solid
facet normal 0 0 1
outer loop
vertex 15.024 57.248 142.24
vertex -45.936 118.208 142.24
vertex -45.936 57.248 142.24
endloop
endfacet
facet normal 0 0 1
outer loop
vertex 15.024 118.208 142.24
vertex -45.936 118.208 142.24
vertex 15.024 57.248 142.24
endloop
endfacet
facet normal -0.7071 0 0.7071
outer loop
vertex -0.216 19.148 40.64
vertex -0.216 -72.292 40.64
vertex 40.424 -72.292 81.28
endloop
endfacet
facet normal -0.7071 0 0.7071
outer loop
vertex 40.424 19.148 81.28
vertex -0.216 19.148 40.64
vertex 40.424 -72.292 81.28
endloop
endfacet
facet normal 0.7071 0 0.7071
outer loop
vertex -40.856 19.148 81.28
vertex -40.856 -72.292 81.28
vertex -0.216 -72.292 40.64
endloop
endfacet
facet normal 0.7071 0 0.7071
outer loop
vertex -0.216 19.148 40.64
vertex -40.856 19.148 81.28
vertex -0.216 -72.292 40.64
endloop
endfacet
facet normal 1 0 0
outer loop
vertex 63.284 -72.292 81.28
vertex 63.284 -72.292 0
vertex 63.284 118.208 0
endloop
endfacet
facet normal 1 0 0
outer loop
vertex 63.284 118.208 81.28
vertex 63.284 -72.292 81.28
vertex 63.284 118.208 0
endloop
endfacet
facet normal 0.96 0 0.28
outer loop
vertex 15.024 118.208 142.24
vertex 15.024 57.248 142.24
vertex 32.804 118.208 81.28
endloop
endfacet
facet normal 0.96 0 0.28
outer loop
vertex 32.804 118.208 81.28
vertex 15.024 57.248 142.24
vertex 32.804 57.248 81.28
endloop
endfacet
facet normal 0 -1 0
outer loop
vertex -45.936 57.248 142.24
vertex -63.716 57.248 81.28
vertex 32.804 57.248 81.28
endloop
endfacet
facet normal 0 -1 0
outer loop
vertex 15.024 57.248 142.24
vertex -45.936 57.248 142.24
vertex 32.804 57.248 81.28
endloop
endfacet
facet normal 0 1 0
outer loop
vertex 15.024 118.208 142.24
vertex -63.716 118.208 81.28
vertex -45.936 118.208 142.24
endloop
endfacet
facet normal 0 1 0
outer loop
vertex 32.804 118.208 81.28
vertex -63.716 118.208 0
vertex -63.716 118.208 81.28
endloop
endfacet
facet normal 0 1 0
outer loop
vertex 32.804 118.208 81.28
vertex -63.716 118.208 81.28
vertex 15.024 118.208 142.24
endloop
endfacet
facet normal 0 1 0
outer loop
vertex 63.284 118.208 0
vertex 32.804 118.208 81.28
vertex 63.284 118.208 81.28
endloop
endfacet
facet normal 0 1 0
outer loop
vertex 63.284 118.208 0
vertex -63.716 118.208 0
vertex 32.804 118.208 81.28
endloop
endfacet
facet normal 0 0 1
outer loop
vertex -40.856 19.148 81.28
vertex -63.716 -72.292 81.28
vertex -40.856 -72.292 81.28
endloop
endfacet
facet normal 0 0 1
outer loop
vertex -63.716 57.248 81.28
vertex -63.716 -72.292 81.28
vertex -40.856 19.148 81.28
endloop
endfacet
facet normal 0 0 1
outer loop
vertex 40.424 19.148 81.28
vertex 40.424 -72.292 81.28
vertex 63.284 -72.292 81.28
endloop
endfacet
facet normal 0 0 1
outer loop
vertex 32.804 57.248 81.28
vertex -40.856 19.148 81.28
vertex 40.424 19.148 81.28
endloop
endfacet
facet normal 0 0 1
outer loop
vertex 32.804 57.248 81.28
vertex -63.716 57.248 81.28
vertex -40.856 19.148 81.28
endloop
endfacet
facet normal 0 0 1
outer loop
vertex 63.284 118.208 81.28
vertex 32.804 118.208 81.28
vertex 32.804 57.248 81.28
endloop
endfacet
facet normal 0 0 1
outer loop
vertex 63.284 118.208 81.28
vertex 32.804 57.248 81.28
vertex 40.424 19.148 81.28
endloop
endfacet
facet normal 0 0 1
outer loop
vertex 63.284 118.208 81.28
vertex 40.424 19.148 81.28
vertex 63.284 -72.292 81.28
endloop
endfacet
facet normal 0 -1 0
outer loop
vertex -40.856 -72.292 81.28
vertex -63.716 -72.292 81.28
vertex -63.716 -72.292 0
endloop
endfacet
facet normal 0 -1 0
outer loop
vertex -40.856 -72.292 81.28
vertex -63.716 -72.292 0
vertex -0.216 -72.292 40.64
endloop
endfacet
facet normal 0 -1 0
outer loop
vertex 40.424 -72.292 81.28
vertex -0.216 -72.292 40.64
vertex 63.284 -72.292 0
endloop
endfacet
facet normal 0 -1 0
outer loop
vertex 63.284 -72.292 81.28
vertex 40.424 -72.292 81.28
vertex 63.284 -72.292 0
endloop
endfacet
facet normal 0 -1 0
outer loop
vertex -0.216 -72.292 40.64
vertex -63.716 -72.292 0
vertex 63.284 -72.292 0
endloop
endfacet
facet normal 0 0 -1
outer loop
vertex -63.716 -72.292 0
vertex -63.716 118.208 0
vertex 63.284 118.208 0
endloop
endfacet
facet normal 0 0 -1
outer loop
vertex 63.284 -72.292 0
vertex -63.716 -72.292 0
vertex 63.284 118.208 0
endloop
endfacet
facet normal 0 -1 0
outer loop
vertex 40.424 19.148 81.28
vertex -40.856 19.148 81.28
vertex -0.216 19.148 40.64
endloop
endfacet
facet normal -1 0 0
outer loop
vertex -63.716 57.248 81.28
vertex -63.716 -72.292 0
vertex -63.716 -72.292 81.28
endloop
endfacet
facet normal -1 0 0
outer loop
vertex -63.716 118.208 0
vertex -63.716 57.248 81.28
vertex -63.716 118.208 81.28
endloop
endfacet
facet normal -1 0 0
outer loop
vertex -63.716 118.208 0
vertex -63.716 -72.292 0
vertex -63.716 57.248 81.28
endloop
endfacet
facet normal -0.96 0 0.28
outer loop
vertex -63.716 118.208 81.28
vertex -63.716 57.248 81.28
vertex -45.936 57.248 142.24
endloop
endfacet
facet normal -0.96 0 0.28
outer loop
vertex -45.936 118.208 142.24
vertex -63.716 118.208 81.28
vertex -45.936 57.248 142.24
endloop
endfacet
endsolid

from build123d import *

# Parameters (mm, degrees)
F0_W     = 127
F0_H     = 190.5
F1_DEPTH = 81.28
F3_DEPTH = 91.44
F4_W     = 96.52
F4_H     = 60.96
F5_DEPTH = 60.96
F7_DEPTH = 60.96


with BuildPart() as f1:
    # F0 (on Top) → F1 (new body)
    with BuildSketch(Plane.XY):
        with Locations((-0.216242, 22.958302)):
            Rectangle(F0_W, F0_H)
    extrude(amount=F1_DEPTH)

    # F2 (on face) → F3 (cut)
    with BuildSketch(Plane.XZ.offset(72.291698)):
        Polygon((40.423758, 81.28), (-40.856242, 81.28), (-0.216242, 40.64), align=None)
    extrude(amount=-F3_DEPTH, mode=Mode.SUBTRACT)

    # F4 (on face) → F5 (join)
    with BuildSketch(Plane.XY.offset(81.28)):
        with Locations((-15.456242, 87.728302)):
            Rectangle(F4_W, F4_H)
    extrude(amount=F5_DEPTH)

    # F6 (on face) → F7 (cut)
    with BuildSketch(Plane.XZ.offset(-57.248302)):
        Polygon((-63.716242, 142.24), (-63.716242, 81.28), (-45.936242, 142.24), align=None)
        Polygon((15.023758, 142.24), (32.803758, 81.28), (32.803758, 142.24), align=None)
    extrude(amount=-F7_DEPTH, mode=Mode.SUBTRACT)


solid = f1.part
